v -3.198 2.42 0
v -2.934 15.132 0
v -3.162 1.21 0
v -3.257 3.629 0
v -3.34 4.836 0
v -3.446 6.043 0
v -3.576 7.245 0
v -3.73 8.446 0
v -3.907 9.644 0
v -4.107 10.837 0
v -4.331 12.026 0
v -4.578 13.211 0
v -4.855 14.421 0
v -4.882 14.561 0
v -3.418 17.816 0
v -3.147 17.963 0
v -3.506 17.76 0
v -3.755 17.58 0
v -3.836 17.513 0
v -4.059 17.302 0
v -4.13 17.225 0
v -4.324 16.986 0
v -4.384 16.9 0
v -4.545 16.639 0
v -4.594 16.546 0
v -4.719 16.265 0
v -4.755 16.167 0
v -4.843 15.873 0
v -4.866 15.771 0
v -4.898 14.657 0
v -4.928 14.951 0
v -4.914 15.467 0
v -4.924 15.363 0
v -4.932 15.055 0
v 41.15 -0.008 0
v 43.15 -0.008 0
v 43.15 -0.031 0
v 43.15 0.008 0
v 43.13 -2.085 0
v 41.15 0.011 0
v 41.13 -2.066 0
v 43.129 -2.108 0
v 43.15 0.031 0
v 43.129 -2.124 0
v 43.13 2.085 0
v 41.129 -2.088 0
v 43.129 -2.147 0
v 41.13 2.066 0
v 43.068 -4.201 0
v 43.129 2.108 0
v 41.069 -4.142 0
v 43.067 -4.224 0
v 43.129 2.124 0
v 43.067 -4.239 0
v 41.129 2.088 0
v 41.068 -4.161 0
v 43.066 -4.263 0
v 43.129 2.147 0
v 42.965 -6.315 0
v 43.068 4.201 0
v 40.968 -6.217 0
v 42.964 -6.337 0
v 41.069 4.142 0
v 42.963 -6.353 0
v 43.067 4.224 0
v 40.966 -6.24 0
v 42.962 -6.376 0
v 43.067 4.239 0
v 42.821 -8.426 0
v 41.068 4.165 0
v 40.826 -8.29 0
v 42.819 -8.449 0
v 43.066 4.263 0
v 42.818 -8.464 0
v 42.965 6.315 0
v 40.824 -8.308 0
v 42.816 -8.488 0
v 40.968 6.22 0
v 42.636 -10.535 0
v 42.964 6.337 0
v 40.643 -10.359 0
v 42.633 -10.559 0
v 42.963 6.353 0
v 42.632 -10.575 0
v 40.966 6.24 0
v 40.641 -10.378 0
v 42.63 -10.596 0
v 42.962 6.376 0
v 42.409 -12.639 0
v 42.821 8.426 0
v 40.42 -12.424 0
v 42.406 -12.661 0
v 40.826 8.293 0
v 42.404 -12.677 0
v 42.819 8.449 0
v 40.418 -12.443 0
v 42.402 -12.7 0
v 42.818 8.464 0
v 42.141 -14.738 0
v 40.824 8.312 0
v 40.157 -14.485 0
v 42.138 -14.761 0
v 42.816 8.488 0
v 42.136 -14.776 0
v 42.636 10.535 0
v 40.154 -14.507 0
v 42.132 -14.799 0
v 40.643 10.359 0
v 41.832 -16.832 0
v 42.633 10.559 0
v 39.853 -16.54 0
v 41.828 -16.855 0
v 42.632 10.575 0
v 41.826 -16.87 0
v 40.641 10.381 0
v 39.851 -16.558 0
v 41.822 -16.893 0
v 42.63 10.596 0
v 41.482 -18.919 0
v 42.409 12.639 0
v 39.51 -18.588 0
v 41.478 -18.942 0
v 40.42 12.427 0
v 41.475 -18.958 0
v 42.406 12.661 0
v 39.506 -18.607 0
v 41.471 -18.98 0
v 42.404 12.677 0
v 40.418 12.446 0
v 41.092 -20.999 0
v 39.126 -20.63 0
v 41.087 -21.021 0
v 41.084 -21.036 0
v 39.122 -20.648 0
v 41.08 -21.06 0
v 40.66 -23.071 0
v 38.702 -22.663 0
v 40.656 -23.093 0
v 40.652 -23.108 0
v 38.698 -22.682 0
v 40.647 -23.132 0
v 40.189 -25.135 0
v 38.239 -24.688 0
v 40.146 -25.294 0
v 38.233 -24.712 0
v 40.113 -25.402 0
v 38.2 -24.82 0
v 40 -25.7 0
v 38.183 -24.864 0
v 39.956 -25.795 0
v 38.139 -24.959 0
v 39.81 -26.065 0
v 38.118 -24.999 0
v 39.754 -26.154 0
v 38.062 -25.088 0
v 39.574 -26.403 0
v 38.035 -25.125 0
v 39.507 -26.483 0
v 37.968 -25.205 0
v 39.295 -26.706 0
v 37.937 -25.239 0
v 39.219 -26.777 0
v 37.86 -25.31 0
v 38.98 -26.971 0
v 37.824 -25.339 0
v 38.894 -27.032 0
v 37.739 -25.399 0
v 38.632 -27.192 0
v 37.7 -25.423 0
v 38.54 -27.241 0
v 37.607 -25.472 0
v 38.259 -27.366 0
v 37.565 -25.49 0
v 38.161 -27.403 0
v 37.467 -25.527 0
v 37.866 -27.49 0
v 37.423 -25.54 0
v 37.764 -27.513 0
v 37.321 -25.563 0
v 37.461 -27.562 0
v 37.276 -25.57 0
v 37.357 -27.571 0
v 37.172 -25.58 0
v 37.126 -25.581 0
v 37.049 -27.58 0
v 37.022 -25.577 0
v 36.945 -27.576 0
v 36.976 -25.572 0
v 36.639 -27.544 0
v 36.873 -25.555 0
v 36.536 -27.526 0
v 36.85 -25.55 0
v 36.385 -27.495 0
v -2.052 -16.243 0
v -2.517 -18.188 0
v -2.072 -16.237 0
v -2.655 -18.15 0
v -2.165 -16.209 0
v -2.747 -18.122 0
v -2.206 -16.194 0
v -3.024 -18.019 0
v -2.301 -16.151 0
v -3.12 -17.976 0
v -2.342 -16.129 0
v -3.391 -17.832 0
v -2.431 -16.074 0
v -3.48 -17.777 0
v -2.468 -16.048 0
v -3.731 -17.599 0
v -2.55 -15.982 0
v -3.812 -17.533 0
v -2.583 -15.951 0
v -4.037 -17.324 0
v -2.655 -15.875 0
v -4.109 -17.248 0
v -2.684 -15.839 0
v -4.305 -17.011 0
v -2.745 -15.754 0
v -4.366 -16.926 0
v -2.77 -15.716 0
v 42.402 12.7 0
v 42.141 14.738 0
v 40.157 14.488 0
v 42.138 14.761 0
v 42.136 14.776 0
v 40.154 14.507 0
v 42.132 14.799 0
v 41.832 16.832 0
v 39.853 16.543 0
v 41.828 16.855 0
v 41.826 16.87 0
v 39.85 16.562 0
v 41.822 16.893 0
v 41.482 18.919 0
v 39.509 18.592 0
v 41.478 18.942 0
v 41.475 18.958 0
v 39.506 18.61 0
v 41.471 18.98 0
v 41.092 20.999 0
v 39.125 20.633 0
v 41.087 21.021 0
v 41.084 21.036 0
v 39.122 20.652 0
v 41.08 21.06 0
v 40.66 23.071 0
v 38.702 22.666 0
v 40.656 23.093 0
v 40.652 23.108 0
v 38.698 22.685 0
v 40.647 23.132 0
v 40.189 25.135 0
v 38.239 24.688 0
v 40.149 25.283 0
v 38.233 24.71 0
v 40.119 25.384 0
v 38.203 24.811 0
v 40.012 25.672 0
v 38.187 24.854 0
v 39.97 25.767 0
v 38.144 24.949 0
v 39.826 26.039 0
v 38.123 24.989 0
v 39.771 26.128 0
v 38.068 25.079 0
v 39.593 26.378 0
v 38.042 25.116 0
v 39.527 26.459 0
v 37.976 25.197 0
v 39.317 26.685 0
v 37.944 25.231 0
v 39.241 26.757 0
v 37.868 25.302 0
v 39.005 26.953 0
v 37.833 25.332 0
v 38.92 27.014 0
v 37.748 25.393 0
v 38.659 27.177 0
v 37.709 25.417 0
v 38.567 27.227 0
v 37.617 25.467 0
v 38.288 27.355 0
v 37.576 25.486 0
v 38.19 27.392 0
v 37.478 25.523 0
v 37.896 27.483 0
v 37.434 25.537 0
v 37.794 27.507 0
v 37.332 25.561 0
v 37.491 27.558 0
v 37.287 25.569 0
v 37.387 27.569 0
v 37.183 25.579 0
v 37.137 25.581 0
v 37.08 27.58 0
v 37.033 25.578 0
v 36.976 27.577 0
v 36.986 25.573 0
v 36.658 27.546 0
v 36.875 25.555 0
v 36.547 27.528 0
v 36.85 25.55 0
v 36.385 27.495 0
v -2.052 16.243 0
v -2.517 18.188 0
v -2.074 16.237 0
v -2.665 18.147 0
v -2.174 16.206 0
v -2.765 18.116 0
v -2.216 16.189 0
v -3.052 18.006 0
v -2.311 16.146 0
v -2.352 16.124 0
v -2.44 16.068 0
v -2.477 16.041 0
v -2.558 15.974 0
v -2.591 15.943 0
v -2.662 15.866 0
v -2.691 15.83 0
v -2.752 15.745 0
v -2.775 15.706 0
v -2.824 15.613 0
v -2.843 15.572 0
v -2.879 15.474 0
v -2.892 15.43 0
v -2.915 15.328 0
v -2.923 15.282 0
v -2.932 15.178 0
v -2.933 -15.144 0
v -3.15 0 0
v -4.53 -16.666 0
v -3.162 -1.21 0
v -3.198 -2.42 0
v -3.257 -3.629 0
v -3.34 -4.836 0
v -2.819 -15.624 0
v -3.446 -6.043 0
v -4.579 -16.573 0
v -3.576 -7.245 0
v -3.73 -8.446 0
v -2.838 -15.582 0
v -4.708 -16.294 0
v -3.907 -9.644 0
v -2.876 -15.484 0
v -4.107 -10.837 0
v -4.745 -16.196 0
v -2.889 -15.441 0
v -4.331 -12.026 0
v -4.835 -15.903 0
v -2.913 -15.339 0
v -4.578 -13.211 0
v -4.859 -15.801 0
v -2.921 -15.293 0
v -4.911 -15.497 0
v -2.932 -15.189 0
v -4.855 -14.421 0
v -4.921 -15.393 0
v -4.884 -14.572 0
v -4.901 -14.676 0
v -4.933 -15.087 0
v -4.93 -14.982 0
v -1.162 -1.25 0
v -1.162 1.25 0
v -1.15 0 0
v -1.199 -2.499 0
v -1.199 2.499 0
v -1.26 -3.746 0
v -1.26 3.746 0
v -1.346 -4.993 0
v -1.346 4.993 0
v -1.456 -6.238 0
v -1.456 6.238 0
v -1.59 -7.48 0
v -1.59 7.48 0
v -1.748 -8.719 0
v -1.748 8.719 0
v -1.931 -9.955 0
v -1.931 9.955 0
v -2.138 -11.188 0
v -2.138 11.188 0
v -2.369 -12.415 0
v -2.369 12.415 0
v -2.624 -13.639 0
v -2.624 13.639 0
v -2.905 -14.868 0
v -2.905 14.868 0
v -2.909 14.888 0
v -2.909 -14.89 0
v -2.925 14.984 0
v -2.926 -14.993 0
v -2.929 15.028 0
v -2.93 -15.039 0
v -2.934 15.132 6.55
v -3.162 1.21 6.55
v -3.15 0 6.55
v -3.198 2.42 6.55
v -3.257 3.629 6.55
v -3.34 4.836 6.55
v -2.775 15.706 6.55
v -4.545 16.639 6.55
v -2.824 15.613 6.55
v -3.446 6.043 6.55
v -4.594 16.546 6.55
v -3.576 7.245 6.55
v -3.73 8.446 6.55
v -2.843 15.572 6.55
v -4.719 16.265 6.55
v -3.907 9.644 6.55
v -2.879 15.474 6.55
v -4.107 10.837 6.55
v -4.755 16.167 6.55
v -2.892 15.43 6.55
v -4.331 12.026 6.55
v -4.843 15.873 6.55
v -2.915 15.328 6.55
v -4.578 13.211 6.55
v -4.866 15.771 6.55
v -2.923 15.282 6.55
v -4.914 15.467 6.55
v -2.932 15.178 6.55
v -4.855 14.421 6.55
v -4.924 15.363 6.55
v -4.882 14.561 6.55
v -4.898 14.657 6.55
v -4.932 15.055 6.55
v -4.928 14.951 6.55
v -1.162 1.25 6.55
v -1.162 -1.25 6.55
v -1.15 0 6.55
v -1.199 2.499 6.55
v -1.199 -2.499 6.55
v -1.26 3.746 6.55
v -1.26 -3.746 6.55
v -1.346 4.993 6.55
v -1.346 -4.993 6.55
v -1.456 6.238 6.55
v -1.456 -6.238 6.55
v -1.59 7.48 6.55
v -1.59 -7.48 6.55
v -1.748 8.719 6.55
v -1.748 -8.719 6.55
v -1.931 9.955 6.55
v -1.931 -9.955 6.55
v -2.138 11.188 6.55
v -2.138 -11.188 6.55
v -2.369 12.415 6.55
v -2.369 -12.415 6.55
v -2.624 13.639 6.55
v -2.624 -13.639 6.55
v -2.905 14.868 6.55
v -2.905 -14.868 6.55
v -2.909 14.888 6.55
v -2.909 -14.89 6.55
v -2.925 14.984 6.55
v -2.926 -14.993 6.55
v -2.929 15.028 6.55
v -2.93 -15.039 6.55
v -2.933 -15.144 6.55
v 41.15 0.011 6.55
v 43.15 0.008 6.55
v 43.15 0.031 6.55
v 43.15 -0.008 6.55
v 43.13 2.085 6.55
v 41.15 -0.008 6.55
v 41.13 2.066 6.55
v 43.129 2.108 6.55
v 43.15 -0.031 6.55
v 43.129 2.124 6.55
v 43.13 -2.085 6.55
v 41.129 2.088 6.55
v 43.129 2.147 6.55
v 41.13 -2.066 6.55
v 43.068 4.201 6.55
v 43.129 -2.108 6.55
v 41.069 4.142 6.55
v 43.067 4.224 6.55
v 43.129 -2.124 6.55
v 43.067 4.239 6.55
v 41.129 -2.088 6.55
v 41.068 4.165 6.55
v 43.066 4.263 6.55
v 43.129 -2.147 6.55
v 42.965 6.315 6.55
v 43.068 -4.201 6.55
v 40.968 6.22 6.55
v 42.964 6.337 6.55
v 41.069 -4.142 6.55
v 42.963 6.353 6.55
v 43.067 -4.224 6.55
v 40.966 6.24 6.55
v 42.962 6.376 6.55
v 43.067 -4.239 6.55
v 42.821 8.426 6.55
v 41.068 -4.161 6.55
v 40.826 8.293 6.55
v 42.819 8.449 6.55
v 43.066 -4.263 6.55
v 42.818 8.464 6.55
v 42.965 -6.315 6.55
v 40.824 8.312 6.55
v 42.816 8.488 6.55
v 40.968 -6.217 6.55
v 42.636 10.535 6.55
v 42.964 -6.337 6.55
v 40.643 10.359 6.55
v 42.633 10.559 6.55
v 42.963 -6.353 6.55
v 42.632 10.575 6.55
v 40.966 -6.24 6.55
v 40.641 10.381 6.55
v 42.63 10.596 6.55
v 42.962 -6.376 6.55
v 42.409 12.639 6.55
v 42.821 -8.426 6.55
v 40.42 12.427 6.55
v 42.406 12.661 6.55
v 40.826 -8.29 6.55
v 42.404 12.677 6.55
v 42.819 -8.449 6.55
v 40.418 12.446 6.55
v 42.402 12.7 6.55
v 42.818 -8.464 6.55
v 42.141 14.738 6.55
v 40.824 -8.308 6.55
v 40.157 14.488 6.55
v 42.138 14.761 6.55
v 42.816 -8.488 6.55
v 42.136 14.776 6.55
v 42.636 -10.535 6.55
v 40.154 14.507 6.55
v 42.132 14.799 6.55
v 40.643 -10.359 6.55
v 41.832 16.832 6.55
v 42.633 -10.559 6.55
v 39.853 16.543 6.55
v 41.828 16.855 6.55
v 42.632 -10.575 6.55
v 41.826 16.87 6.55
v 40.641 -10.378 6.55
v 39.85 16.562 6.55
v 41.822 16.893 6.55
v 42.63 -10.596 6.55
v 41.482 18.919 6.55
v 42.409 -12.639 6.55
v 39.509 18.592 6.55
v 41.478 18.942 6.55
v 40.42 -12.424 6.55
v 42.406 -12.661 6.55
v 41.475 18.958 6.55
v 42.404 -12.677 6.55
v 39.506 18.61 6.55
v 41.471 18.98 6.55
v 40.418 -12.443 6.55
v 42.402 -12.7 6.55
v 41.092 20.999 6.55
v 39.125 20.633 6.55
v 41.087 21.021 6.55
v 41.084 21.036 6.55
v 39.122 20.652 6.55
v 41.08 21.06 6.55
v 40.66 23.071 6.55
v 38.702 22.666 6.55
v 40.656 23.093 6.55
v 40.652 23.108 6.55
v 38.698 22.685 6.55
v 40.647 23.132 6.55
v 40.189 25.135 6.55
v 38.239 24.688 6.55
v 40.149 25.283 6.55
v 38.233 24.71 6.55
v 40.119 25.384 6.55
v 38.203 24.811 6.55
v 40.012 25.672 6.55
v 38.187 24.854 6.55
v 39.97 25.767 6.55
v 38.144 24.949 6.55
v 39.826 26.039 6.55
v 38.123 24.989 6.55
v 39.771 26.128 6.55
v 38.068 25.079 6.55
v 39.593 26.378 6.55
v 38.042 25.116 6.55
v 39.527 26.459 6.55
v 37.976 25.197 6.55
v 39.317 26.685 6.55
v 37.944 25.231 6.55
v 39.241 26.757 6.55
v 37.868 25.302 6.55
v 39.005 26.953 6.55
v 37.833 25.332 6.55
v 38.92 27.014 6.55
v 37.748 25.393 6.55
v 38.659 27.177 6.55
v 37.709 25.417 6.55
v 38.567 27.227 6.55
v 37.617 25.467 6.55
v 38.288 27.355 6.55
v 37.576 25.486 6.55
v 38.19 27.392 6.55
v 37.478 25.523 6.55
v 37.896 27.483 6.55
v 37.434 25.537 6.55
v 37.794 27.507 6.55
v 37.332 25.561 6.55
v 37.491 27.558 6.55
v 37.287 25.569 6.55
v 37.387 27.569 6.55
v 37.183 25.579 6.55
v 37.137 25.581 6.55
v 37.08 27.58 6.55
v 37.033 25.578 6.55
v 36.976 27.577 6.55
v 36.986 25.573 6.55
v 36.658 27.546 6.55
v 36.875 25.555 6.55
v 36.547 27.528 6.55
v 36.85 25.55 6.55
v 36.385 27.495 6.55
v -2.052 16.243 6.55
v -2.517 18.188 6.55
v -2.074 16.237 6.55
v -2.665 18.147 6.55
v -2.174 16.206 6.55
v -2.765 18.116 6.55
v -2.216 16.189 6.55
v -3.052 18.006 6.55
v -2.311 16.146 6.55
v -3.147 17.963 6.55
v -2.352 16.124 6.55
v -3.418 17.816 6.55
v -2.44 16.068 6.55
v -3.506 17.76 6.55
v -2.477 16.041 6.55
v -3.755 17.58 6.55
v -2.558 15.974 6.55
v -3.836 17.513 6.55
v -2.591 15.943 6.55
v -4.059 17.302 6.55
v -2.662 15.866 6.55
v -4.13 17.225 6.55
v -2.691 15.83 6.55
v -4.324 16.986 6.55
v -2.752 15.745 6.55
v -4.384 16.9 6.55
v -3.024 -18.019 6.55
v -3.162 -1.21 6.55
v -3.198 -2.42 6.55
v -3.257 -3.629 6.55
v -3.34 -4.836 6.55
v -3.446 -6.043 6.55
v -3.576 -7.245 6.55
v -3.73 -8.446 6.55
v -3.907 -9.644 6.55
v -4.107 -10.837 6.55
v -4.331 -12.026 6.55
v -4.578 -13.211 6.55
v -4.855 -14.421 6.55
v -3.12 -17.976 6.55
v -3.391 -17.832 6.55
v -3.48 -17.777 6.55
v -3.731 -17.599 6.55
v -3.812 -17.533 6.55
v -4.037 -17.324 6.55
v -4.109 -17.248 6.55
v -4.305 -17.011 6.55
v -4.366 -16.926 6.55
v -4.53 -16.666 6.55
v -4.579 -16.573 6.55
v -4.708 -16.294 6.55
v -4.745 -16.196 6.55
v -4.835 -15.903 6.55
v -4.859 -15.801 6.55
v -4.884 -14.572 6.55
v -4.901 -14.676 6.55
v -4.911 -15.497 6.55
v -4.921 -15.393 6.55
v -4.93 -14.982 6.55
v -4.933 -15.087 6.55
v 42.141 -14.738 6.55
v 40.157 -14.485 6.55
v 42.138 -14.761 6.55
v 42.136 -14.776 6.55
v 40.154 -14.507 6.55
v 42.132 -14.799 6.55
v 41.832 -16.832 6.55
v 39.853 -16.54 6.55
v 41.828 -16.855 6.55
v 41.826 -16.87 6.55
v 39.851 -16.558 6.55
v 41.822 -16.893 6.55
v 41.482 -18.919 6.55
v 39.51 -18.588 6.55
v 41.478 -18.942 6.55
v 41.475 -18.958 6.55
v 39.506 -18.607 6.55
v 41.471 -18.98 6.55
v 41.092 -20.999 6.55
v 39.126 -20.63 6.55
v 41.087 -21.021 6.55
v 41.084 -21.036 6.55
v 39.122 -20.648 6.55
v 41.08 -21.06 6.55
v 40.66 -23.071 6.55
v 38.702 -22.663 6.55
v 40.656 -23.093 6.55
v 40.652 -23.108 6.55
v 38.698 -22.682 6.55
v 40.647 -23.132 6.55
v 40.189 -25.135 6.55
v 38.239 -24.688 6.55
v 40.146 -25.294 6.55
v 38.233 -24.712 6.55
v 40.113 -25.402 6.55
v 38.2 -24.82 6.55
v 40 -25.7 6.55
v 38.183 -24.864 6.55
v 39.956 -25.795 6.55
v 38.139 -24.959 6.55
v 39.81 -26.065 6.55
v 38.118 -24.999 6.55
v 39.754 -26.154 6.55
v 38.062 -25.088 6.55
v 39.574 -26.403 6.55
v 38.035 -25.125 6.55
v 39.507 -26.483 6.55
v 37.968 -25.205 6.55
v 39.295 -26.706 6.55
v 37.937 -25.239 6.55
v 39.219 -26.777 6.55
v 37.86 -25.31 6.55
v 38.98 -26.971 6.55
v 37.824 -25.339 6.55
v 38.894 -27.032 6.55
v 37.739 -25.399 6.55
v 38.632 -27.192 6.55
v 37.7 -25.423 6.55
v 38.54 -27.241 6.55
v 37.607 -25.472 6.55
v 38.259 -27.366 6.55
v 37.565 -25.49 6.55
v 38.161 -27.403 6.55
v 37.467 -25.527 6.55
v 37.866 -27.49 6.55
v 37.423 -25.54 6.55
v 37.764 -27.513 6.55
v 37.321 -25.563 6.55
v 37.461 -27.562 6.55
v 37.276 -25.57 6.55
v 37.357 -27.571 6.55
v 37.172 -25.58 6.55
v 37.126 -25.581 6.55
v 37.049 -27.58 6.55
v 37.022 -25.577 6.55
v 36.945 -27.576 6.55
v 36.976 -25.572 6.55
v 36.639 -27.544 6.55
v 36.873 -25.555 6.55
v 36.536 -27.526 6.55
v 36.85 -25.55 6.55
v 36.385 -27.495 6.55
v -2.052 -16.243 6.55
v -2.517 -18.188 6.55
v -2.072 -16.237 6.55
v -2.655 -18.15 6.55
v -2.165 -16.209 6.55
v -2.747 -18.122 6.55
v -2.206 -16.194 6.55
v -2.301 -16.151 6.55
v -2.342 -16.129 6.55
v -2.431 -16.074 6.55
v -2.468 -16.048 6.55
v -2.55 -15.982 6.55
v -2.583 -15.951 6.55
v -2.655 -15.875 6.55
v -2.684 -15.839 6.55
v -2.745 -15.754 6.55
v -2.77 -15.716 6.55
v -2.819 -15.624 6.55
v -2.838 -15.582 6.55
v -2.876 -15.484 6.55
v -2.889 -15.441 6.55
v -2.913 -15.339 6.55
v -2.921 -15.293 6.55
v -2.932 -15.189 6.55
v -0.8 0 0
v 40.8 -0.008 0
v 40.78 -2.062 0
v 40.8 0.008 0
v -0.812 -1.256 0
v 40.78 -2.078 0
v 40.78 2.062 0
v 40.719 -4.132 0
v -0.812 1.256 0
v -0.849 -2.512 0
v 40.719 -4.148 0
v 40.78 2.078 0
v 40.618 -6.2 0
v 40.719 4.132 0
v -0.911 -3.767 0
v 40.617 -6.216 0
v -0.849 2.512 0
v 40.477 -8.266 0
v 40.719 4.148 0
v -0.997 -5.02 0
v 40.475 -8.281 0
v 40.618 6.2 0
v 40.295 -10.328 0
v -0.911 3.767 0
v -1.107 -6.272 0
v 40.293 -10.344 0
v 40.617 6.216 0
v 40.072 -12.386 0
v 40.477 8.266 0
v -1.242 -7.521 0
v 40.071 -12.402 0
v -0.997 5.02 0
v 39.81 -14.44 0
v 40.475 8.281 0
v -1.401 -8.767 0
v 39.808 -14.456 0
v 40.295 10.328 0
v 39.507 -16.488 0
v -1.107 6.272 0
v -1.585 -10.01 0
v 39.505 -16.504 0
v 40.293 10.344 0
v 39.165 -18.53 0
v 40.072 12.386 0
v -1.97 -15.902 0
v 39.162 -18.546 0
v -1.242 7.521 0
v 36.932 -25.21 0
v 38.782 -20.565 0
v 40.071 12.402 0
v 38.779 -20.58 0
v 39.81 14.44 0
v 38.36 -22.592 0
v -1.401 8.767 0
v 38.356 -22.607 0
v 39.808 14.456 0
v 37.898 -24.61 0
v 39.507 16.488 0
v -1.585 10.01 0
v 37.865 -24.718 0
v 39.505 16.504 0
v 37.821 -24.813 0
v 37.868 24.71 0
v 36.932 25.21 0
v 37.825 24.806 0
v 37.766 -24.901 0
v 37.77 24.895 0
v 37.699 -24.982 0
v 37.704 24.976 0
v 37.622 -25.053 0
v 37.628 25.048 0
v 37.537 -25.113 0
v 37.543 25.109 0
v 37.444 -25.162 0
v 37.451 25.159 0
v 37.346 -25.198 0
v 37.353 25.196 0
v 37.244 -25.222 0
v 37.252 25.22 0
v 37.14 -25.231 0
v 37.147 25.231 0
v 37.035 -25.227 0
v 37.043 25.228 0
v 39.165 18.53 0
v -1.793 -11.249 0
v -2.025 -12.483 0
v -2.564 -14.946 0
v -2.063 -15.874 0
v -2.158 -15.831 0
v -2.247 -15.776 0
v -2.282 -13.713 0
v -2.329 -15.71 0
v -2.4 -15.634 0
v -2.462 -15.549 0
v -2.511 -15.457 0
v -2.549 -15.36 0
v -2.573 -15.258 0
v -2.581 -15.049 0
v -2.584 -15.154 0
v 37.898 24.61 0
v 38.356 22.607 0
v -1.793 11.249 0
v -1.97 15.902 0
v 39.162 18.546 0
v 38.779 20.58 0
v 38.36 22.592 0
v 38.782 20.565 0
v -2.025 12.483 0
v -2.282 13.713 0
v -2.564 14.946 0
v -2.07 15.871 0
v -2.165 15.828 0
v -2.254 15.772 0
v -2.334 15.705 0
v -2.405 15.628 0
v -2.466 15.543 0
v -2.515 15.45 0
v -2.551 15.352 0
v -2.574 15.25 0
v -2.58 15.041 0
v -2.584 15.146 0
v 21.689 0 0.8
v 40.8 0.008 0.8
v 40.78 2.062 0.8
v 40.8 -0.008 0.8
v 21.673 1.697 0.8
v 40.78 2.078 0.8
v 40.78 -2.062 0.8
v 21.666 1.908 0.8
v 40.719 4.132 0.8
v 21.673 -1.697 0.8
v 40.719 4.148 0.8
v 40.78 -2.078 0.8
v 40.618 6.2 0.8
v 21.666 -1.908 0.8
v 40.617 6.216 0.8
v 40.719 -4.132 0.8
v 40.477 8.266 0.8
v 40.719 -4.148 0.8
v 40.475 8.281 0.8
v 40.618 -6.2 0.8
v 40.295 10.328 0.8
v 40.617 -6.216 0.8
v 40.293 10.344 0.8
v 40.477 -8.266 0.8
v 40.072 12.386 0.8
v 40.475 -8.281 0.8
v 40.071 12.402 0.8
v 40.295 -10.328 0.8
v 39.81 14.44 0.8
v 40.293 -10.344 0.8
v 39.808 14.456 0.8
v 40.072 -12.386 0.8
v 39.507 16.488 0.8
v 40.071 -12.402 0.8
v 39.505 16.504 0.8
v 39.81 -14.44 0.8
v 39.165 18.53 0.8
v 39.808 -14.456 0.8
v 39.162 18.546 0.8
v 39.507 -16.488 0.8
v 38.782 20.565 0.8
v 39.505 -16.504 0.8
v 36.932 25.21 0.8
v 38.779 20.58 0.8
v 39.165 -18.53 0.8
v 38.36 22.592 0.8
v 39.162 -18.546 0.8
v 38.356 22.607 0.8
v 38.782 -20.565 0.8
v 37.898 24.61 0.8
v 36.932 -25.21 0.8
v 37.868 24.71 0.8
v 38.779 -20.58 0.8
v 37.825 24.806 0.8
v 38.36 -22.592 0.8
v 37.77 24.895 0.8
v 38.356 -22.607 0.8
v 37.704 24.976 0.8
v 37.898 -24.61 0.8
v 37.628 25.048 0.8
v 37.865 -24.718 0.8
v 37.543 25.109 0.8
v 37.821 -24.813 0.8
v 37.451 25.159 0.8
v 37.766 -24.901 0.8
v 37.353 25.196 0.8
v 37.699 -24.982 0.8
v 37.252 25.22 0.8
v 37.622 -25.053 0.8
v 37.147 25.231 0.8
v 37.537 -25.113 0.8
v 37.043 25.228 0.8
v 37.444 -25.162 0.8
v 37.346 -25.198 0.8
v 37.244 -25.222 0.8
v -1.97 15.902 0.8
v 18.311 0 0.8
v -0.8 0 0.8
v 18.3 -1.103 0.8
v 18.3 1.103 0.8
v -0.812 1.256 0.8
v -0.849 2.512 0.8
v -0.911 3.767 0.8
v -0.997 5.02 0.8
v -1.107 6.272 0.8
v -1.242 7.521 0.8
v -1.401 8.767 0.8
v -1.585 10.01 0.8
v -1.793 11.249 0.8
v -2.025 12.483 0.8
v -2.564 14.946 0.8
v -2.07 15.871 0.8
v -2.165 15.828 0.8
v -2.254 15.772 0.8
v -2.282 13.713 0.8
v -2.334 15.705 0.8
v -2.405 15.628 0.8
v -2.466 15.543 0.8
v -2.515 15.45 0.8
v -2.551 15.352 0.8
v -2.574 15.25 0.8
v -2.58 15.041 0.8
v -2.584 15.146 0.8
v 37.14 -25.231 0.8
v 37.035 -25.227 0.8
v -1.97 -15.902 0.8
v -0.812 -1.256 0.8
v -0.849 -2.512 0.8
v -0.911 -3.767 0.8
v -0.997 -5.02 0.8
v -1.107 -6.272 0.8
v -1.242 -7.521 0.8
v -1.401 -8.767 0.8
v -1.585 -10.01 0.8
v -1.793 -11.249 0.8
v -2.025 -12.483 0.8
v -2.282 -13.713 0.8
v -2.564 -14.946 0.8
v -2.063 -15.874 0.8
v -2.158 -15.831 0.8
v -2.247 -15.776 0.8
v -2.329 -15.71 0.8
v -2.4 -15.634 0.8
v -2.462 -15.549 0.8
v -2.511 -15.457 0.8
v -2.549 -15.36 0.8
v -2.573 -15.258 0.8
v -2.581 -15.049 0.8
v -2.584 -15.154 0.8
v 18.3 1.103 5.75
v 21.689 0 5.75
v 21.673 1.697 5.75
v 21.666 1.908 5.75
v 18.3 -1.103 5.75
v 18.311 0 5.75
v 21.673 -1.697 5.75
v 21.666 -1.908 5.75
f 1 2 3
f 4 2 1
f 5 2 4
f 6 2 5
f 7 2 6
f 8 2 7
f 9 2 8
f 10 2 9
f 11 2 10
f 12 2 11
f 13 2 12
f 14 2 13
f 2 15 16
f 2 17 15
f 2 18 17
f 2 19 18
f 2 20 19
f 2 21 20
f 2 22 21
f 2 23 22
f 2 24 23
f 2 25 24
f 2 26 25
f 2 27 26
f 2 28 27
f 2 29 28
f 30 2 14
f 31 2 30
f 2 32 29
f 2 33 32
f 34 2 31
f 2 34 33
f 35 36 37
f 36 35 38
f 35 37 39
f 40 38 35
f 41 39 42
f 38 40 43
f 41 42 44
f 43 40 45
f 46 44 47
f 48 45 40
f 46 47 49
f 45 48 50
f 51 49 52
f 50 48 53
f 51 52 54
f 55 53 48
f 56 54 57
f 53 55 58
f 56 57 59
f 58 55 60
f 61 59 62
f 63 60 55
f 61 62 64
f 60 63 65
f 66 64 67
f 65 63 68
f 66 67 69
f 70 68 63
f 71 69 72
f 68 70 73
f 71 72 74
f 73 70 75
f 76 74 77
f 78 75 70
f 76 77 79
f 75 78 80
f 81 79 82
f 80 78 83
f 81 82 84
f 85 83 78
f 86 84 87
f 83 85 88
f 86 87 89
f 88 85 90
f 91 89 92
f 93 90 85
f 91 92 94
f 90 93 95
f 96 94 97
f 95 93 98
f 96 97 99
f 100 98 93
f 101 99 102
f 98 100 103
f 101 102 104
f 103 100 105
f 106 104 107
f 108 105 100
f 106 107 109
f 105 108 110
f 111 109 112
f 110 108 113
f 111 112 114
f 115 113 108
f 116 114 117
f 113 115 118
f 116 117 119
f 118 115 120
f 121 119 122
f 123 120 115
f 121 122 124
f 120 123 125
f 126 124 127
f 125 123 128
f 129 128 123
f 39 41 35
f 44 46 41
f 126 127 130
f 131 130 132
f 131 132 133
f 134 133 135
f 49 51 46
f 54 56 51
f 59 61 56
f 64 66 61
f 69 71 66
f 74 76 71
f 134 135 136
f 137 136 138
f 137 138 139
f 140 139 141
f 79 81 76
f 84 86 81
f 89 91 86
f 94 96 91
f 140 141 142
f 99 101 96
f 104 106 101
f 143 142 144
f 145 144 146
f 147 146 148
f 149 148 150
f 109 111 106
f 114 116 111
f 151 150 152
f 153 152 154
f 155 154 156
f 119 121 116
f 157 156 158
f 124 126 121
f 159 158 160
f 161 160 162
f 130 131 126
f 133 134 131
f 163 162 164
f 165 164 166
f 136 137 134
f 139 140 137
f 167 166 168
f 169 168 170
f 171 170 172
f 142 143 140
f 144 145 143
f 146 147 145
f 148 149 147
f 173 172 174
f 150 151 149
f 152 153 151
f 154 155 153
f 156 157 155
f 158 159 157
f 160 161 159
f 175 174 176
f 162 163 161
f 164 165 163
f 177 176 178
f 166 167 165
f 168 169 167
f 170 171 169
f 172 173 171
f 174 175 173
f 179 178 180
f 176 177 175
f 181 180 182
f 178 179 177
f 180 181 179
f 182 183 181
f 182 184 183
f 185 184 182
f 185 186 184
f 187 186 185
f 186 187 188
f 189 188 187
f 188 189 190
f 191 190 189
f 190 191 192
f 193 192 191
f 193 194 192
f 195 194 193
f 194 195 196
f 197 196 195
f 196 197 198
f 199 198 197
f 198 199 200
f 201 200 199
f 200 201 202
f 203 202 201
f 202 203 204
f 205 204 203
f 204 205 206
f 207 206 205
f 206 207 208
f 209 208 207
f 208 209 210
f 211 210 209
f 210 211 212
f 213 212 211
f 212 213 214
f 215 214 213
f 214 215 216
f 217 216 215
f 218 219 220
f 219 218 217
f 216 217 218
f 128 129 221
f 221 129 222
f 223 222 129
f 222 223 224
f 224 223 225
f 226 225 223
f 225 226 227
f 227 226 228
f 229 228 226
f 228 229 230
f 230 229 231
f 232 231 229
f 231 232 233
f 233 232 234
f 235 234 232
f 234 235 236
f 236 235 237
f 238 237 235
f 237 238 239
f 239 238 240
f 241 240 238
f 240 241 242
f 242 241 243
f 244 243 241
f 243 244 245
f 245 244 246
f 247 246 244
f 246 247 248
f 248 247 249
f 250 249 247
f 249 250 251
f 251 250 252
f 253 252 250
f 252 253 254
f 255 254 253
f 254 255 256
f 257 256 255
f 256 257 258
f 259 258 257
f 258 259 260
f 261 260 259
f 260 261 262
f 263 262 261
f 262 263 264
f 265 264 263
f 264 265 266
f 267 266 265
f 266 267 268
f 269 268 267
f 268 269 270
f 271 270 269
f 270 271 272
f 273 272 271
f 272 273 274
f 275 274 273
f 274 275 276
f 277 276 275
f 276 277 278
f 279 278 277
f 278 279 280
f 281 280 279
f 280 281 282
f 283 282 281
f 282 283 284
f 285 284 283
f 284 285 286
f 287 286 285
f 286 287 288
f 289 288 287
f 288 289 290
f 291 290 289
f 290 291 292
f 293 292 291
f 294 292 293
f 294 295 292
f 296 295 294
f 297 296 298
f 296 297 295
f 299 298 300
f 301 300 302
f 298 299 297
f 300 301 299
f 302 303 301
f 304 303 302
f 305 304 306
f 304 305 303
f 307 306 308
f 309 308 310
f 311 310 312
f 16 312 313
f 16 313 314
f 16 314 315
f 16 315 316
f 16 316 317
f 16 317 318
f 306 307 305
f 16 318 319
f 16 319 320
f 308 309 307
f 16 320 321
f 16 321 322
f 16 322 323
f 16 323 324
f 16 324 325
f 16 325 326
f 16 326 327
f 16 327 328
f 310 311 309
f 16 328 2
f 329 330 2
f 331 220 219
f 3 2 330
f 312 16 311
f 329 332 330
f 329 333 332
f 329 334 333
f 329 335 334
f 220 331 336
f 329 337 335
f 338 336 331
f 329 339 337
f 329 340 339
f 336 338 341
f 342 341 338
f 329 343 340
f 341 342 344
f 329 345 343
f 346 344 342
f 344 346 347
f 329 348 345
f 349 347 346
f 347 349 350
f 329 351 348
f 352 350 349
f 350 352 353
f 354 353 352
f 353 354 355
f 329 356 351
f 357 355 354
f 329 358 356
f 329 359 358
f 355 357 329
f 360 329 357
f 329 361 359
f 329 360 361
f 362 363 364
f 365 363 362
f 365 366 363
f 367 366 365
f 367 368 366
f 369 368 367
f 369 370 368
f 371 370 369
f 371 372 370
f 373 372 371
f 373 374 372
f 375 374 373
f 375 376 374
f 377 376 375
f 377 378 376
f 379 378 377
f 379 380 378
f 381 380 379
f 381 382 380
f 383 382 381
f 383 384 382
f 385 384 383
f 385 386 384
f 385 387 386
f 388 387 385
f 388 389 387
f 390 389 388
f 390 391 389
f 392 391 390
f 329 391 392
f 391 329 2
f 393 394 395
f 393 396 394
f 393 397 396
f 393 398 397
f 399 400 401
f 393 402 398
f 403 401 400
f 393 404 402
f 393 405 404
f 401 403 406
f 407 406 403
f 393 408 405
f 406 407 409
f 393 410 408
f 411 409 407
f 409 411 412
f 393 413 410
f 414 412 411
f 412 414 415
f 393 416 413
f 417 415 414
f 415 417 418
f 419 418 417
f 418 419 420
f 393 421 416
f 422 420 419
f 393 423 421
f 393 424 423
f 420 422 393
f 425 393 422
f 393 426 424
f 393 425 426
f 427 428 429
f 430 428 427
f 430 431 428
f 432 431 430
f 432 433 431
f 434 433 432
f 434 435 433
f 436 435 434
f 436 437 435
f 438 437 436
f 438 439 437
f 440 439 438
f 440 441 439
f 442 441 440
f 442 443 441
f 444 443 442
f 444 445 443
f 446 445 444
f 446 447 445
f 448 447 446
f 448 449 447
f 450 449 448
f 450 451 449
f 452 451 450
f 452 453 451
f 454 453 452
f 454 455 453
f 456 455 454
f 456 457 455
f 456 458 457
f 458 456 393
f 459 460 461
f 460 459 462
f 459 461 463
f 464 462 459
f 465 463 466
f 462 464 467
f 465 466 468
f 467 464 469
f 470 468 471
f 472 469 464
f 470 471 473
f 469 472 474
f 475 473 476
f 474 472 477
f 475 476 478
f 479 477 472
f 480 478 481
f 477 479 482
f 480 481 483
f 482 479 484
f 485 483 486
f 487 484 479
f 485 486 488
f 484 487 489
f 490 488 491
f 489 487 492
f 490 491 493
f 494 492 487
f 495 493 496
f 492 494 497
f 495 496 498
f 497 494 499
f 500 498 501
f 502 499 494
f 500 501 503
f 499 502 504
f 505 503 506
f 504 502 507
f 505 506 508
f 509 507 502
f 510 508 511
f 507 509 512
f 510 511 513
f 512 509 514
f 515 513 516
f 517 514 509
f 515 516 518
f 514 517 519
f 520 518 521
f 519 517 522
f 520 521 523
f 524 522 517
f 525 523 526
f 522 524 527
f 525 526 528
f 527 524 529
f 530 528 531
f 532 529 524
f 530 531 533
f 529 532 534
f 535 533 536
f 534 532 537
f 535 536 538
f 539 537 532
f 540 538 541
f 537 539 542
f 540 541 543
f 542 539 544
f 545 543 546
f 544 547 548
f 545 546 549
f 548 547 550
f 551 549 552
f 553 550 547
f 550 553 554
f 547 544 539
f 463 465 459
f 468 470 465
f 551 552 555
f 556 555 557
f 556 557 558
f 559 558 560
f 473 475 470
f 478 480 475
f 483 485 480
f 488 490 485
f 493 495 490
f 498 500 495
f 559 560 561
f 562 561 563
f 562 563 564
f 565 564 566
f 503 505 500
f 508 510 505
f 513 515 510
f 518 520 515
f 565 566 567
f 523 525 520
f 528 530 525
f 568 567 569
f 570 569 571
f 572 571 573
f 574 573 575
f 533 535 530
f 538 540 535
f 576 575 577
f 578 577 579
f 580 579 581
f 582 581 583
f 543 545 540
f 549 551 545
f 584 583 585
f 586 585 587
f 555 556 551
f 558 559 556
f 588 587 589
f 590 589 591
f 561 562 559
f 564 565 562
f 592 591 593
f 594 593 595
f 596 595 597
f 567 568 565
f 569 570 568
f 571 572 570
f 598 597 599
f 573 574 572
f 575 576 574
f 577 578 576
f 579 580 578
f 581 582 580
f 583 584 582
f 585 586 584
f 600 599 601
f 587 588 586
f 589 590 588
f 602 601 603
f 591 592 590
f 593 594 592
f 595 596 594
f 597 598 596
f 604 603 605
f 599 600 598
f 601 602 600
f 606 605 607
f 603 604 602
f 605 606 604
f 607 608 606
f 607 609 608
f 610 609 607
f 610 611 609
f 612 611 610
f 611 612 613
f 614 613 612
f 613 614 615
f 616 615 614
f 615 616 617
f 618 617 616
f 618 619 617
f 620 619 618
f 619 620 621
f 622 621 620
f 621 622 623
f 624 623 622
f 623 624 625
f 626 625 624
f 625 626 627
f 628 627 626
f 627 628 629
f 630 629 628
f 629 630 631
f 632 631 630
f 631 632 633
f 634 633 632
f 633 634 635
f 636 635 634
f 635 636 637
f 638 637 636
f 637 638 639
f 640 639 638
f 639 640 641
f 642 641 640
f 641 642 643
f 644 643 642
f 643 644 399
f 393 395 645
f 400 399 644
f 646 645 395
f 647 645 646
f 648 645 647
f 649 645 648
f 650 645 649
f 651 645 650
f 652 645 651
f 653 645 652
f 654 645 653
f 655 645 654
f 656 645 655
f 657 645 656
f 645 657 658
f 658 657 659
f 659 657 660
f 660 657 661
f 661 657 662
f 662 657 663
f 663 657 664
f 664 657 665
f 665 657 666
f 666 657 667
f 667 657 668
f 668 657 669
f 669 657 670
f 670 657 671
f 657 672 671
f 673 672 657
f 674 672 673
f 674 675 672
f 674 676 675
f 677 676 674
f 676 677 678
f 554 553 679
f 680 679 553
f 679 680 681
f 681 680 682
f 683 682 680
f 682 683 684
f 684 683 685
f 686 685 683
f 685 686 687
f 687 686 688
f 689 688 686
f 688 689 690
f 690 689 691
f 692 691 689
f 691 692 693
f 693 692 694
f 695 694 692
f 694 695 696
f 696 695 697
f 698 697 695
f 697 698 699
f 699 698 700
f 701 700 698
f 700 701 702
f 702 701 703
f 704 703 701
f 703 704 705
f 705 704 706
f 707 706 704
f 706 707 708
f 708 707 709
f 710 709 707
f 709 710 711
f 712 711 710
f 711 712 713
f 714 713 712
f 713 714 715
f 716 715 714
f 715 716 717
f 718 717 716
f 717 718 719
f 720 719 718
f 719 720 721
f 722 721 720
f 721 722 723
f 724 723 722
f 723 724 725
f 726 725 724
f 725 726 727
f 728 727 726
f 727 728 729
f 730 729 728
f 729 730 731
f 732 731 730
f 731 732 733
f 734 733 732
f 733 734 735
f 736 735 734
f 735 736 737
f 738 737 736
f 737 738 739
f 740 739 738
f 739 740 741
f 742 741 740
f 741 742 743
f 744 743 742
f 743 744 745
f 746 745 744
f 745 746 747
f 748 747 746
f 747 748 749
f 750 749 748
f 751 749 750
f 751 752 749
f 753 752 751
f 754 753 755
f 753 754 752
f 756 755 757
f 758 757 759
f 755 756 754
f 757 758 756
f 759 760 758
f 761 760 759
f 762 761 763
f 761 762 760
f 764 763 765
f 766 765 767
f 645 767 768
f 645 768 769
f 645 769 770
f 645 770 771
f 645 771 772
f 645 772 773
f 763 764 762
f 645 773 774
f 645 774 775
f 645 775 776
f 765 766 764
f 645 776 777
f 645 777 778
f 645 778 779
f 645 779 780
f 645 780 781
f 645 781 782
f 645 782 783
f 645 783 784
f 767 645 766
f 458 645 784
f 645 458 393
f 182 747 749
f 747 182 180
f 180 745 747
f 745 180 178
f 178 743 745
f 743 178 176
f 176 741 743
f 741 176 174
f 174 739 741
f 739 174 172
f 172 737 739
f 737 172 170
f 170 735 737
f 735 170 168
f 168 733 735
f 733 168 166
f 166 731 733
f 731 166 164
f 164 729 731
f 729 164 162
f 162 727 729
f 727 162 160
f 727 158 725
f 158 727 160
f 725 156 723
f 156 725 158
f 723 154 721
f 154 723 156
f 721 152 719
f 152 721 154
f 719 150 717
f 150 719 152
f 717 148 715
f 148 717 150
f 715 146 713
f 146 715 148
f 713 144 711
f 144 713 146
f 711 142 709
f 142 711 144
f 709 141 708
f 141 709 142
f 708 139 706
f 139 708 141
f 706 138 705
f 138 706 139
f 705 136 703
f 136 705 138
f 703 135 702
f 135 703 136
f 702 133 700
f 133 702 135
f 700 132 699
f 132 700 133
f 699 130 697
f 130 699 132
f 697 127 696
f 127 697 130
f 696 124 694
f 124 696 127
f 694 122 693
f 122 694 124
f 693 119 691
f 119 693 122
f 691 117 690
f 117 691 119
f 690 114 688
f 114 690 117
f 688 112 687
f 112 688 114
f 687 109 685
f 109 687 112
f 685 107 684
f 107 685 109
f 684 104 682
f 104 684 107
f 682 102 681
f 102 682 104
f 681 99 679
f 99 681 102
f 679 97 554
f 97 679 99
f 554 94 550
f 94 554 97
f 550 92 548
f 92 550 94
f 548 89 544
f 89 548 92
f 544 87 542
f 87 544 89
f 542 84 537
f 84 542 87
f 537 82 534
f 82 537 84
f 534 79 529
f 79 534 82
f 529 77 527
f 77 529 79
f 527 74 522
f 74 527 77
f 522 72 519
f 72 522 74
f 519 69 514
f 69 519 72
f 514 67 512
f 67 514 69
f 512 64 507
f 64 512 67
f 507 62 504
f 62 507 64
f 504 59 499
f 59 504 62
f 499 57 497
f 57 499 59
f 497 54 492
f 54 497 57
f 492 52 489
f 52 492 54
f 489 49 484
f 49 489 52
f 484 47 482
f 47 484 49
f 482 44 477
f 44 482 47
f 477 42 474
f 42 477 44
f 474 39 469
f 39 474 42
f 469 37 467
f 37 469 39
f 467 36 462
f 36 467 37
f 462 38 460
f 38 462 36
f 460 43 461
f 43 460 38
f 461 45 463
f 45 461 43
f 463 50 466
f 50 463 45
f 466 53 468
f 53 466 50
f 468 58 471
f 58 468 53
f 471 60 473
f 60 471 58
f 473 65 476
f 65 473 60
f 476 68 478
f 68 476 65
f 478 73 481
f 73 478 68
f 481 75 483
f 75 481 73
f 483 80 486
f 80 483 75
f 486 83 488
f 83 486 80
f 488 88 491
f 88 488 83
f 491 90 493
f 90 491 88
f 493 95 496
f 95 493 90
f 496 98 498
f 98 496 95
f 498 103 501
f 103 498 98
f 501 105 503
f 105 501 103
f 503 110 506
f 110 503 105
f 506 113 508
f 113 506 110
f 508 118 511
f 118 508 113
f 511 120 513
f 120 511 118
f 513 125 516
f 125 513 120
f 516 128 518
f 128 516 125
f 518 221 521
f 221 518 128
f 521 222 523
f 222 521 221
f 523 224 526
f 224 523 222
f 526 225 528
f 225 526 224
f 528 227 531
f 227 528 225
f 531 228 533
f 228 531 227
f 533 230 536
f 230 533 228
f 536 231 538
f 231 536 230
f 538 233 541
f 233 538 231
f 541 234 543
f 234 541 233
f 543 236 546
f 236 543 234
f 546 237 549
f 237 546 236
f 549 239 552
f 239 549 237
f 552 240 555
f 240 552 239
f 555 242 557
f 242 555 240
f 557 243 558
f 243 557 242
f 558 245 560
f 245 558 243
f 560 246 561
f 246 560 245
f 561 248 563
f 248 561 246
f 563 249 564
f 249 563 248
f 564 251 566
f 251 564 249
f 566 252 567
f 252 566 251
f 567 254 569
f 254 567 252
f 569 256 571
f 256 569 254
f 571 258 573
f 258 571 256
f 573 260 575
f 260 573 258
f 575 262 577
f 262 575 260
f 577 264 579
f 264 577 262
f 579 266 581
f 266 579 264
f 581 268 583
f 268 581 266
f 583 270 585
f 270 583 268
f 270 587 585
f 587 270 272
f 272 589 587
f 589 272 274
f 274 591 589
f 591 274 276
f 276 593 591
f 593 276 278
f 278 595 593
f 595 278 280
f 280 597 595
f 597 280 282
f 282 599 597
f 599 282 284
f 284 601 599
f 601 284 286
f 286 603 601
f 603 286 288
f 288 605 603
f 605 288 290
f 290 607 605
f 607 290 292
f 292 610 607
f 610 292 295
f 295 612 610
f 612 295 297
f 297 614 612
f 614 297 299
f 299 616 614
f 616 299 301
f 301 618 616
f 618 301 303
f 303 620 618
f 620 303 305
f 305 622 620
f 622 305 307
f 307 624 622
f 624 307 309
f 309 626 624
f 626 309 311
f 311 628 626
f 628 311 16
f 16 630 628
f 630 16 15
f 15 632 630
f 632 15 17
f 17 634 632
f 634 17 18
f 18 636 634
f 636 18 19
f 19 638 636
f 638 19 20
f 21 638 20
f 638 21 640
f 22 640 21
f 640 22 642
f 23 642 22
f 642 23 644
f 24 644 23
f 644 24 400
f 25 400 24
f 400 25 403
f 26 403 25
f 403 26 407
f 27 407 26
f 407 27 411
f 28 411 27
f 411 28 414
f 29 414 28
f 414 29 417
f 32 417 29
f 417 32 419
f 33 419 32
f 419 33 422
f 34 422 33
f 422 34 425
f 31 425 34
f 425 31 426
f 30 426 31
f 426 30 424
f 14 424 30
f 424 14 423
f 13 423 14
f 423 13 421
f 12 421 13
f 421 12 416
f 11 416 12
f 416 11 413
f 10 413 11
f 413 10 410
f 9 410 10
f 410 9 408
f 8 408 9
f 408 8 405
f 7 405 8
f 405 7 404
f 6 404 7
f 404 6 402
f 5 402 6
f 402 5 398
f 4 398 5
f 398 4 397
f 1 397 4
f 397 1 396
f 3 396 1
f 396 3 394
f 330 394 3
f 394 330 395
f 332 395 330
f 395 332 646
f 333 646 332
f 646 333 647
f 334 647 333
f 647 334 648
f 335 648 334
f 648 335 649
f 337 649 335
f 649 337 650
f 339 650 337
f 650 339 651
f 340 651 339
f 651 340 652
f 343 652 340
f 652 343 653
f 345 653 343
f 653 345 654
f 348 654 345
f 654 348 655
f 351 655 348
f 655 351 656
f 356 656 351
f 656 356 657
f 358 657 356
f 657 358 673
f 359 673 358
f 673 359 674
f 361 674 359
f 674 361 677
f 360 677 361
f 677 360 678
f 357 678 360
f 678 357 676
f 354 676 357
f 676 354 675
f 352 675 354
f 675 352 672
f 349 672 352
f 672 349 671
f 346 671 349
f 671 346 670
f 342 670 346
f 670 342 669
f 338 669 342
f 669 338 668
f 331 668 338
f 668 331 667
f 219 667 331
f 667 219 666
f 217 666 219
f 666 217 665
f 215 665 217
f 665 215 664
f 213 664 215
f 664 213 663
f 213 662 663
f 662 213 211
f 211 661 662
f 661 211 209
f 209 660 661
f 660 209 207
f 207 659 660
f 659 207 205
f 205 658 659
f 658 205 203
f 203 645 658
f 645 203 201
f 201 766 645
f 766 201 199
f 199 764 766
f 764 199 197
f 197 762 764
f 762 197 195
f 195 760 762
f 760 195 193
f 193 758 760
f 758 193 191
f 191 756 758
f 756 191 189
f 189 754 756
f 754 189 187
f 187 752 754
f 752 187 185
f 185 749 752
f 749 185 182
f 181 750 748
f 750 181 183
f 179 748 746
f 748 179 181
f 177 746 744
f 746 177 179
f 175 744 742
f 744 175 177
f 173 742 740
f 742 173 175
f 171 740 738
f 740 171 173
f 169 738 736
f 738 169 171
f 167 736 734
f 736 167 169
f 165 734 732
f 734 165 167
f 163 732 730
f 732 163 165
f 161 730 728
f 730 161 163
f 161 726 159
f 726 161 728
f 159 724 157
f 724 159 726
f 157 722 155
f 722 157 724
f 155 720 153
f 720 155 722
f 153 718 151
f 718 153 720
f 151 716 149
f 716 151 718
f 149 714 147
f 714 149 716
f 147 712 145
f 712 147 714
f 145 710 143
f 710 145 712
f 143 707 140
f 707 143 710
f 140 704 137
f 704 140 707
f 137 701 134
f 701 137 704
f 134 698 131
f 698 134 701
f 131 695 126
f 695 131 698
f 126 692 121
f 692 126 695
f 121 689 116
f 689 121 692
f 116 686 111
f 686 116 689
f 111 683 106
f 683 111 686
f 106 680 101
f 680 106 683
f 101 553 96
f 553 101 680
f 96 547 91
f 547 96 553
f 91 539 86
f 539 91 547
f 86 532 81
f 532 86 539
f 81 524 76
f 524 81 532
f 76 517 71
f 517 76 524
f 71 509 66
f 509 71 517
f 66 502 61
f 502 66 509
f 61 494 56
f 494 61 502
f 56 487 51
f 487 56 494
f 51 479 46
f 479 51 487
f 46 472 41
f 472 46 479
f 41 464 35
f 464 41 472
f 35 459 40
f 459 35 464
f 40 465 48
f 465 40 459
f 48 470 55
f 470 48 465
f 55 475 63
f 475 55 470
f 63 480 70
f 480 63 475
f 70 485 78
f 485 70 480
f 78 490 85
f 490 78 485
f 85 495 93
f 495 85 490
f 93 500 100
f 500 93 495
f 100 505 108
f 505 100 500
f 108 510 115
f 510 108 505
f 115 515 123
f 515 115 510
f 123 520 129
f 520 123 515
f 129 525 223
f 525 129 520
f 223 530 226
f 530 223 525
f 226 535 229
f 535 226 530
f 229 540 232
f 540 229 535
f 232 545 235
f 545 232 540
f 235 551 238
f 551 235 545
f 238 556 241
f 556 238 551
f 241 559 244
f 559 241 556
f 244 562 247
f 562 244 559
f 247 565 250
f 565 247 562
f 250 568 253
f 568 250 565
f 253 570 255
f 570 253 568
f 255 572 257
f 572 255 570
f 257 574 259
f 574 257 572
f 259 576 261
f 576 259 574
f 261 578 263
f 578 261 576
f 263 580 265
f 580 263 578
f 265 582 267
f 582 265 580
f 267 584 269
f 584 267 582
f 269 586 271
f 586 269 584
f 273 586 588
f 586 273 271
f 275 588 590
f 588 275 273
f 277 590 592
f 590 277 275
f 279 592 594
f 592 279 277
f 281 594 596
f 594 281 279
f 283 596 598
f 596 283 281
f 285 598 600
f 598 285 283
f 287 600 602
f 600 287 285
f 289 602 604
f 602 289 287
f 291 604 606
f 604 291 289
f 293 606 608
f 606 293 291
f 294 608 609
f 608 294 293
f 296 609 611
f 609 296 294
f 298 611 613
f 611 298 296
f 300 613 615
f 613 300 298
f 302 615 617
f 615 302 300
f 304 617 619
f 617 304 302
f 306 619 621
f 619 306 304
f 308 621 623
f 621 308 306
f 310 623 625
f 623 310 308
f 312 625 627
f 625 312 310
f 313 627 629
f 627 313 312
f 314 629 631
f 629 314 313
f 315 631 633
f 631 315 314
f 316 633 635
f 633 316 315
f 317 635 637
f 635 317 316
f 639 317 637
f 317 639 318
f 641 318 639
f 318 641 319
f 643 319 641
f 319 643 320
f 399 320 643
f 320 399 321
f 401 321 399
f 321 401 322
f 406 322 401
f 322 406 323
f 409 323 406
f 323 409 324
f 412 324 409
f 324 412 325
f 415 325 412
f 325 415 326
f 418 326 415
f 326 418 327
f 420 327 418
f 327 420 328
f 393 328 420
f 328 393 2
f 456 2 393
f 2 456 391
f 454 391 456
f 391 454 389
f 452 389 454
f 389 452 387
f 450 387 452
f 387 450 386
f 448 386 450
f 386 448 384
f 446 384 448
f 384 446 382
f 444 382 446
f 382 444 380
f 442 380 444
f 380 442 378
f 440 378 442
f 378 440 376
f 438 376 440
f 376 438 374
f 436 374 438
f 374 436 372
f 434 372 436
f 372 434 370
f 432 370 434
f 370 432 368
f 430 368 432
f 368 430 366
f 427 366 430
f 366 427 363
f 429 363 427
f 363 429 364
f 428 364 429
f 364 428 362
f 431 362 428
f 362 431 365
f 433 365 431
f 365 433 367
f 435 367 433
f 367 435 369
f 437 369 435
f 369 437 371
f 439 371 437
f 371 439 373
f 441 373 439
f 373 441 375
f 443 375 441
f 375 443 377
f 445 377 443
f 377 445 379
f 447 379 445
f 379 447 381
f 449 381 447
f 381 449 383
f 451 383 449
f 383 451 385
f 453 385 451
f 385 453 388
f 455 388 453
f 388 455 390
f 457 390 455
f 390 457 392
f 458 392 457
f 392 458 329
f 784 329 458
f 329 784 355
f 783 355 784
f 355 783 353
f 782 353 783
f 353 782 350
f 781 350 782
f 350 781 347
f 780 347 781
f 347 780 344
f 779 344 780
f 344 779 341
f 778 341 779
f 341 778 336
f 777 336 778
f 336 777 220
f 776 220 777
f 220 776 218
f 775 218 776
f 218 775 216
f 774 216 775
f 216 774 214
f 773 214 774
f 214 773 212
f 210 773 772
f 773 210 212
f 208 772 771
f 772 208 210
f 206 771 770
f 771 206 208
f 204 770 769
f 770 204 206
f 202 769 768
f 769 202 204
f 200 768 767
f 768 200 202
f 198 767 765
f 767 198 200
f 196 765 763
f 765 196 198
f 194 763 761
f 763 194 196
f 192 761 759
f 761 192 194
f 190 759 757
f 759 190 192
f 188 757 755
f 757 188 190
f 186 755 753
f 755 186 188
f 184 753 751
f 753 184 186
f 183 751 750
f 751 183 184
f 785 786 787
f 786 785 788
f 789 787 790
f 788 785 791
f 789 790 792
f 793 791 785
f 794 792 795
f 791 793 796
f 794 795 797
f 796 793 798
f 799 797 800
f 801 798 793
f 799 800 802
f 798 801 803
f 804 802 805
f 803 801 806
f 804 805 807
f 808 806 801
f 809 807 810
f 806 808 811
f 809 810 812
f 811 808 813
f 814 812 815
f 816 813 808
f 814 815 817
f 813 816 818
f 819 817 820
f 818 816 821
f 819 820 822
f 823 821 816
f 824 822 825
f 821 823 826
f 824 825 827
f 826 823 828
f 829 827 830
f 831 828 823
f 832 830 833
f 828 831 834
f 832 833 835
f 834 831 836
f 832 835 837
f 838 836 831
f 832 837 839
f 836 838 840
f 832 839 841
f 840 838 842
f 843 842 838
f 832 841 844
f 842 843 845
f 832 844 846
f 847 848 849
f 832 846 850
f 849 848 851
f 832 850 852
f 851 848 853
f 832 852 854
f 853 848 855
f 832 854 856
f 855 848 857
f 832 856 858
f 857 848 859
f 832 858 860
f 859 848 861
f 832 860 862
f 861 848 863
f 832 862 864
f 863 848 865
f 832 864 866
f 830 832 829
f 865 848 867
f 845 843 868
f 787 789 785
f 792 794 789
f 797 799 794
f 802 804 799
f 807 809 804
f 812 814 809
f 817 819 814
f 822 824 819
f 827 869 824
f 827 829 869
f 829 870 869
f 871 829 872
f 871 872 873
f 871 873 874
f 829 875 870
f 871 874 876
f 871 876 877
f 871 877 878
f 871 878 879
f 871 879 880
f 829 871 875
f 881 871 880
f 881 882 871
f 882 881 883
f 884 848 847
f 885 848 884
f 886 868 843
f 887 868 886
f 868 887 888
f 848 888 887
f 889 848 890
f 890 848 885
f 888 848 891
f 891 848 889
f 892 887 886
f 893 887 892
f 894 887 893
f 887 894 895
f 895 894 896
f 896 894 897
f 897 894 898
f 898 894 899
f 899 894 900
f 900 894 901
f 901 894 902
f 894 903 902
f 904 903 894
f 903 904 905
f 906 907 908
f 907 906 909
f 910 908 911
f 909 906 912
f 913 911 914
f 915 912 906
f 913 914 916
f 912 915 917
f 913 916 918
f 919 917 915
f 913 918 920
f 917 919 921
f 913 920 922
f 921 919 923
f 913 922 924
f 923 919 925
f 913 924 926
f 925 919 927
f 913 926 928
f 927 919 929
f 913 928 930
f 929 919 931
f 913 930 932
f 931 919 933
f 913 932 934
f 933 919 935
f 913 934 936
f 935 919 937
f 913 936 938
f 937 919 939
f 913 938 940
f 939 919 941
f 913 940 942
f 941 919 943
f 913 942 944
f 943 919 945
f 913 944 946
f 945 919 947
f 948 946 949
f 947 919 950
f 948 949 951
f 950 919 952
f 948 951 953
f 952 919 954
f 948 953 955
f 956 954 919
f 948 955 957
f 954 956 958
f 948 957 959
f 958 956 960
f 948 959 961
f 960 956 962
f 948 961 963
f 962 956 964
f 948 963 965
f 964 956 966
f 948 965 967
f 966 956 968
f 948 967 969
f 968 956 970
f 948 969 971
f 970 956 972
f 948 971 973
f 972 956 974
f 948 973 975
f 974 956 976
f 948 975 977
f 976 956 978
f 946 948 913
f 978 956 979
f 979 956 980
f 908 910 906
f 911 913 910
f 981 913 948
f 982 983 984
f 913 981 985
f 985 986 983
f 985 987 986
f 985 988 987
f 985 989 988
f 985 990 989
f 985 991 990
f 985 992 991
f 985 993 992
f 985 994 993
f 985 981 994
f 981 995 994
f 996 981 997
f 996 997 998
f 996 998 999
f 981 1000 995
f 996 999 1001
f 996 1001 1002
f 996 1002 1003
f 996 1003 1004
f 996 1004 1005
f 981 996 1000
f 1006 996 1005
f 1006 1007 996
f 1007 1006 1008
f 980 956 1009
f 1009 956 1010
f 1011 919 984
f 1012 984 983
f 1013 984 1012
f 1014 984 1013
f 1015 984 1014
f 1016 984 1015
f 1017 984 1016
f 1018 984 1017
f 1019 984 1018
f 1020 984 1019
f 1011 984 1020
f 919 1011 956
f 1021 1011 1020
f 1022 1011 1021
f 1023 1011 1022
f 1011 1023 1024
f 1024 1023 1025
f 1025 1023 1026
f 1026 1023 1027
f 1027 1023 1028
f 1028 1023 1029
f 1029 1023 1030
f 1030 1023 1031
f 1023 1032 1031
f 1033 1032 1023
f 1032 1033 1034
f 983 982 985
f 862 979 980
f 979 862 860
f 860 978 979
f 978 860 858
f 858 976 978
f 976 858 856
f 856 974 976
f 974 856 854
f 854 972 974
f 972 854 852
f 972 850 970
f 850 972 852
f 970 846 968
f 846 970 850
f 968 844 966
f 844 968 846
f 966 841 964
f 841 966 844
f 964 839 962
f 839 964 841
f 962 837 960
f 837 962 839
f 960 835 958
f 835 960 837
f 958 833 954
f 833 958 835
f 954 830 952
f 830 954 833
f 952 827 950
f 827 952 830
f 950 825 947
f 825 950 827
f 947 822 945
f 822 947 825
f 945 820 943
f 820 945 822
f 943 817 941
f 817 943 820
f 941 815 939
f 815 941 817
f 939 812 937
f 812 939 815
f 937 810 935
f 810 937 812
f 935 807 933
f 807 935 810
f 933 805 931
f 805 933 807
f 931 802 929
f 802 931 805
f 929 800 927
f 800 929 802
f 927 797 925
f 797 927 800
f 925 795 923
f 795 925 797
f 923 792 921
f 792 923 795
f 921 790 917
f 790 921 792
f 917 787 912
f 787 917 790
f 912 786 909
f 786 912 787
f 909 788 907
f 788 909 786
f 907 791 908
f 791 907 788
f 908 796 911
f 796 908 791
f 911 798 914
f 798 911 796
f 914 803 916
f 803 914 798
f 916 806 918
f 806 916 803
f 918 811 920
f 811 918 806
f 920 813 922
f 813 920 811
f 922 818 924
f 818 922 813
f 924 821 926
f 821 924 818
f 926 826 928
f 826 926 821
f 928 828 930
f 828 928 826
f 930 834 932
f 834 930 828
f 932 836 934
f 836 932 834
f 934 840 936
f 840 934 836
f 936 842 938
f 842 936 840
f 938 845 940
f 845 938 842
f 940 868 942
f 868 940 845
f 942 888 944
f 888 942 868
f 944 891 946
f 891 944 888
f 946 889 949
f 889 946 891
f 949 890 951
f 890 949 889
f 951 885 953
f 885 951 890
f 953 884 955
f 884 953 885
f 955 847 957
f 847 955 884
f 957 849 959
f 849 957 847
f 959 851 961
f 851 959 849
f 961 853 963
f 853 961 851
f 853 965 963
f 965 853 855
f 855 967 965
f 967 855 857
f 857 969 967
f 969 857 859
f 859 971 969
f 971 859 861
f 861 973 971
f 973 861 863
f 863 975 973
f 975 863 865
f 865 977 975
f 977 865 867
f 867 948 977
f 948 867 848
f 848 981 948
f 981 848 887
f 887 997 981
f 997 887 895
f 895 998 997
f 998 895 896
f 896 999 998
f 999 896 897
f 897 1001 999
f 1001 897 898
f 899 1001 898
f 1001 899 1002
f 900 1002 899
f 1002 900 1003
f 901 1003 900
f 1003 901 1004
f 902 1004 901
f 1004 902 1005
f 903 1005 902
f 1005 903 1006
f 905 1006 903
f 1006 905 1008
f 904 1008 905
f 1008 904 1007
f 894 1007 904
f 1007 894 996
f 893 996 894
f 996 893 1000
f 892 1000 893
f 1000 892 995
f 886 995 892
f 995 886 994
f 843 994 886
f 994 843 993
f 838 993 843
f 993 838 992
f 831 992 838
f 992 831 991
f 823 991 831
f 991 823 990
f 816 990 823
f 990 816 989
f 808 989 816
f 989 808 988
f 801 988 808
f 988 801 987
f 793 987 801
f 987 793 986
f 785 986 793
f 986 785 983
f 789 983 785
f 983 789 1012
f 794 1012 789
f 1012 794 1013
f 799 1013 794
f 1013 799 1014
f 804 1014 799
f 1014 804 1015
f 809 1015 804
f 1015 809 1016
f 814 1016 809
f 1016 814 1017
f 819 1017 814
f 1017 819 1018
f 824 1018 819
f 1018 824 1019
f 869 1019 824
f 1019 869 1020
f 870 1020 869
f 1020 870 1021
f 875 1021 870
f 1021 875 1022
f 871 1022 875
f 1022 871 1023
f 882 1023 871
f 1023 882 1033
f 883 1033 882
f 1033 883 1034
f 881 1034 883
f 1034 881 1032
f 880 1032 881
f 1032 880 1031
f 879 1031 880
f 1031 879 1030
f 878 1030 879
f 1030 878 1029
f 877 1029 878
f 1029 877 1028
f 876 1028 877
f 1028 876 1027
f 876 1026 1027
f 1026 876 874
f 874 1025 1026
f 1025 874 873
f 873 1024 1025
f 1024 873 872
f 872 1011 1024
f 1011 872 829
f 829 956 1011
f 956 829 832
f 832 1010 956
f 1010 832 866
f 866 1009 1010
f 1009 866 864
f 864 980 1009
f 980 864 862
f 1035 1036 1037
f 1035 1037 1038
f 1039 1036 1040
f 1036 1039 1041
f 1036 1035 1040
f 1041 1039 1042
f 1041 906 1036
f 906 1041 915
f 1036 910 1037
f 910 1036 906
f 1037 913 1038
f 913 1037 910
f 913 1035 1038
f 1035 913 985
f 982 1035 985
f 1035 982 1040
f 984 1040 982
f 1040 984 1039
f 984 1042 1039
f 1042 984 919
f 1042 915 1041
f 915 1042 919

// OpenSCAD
// Gen-CK — fit coupon (bay part): O20/O5 THROUGH pockets at carrier thickness (test on a steel offcut), 608 seat,
// D-flat bore, gap shim, and one bobbin-bay slice (bobbin footprint + bay_clear) to test former fit.
include <parameters.scad>;
$fn = 48;
// D-flat keyed bore: flat faces +X (angle 0 = magnet pocket 0 = index notch)
module dflat_bore(h) {
    intersection() {
        cylinder(d=shaft_bore, h=h);
        translate([-shaft_bore, -shaft_bore, 0]) cube([shaft_bore + dflat_x, 2*shaft_bore, h]);
    }
}
module sector_2d(r_in, r_out, ang) {
    polygon([
        for (a = [-ang/2 : ang/24 : ang/2]) [r_in*cos(a), r_in*sin(a)],
        for (a = [ang/2 : -ang/24 : -ang/2]) [r_out*cos(a), r_out*sin(a)]
    ]);
}
module footprint_2d() { offset(r=wall) sector_2d(coil_id_r, coil_od_r, span_deg); }
module hub_2d()       { offset(delta=-coil_core_inset) sector_2d(coil_id_r, coil_od_r, span_deg); }

// bay slice at FULL stator thickness with one bobbin BASE printed IN PLACE inside it (bay_clear gap): this is the
// print-in-place test for the one-plate stator. After printing, the base must pop out with finger pressure; if it is fused,
// print coil_former.stl separately (print-packs/parts/) instead of using the in-place bases.
translate([-coil_id_r, 0, 0]) {
    difference() {
        linear_extrude(stator_thick) offset(r=bay_clear + 2) footprint_2d();
        translate([0, 0, -0.1]) linear_extrude(stator_thick + 0.2) offset(r=bay_clear) footprint_2d();
    }
    union() {
        linear_extrude(flange_t) footprint_2d();
        translate([0, 0, flange_t - 0.01]) linear_extrude(former_web + 0.01) hub_2d();
    }
}
